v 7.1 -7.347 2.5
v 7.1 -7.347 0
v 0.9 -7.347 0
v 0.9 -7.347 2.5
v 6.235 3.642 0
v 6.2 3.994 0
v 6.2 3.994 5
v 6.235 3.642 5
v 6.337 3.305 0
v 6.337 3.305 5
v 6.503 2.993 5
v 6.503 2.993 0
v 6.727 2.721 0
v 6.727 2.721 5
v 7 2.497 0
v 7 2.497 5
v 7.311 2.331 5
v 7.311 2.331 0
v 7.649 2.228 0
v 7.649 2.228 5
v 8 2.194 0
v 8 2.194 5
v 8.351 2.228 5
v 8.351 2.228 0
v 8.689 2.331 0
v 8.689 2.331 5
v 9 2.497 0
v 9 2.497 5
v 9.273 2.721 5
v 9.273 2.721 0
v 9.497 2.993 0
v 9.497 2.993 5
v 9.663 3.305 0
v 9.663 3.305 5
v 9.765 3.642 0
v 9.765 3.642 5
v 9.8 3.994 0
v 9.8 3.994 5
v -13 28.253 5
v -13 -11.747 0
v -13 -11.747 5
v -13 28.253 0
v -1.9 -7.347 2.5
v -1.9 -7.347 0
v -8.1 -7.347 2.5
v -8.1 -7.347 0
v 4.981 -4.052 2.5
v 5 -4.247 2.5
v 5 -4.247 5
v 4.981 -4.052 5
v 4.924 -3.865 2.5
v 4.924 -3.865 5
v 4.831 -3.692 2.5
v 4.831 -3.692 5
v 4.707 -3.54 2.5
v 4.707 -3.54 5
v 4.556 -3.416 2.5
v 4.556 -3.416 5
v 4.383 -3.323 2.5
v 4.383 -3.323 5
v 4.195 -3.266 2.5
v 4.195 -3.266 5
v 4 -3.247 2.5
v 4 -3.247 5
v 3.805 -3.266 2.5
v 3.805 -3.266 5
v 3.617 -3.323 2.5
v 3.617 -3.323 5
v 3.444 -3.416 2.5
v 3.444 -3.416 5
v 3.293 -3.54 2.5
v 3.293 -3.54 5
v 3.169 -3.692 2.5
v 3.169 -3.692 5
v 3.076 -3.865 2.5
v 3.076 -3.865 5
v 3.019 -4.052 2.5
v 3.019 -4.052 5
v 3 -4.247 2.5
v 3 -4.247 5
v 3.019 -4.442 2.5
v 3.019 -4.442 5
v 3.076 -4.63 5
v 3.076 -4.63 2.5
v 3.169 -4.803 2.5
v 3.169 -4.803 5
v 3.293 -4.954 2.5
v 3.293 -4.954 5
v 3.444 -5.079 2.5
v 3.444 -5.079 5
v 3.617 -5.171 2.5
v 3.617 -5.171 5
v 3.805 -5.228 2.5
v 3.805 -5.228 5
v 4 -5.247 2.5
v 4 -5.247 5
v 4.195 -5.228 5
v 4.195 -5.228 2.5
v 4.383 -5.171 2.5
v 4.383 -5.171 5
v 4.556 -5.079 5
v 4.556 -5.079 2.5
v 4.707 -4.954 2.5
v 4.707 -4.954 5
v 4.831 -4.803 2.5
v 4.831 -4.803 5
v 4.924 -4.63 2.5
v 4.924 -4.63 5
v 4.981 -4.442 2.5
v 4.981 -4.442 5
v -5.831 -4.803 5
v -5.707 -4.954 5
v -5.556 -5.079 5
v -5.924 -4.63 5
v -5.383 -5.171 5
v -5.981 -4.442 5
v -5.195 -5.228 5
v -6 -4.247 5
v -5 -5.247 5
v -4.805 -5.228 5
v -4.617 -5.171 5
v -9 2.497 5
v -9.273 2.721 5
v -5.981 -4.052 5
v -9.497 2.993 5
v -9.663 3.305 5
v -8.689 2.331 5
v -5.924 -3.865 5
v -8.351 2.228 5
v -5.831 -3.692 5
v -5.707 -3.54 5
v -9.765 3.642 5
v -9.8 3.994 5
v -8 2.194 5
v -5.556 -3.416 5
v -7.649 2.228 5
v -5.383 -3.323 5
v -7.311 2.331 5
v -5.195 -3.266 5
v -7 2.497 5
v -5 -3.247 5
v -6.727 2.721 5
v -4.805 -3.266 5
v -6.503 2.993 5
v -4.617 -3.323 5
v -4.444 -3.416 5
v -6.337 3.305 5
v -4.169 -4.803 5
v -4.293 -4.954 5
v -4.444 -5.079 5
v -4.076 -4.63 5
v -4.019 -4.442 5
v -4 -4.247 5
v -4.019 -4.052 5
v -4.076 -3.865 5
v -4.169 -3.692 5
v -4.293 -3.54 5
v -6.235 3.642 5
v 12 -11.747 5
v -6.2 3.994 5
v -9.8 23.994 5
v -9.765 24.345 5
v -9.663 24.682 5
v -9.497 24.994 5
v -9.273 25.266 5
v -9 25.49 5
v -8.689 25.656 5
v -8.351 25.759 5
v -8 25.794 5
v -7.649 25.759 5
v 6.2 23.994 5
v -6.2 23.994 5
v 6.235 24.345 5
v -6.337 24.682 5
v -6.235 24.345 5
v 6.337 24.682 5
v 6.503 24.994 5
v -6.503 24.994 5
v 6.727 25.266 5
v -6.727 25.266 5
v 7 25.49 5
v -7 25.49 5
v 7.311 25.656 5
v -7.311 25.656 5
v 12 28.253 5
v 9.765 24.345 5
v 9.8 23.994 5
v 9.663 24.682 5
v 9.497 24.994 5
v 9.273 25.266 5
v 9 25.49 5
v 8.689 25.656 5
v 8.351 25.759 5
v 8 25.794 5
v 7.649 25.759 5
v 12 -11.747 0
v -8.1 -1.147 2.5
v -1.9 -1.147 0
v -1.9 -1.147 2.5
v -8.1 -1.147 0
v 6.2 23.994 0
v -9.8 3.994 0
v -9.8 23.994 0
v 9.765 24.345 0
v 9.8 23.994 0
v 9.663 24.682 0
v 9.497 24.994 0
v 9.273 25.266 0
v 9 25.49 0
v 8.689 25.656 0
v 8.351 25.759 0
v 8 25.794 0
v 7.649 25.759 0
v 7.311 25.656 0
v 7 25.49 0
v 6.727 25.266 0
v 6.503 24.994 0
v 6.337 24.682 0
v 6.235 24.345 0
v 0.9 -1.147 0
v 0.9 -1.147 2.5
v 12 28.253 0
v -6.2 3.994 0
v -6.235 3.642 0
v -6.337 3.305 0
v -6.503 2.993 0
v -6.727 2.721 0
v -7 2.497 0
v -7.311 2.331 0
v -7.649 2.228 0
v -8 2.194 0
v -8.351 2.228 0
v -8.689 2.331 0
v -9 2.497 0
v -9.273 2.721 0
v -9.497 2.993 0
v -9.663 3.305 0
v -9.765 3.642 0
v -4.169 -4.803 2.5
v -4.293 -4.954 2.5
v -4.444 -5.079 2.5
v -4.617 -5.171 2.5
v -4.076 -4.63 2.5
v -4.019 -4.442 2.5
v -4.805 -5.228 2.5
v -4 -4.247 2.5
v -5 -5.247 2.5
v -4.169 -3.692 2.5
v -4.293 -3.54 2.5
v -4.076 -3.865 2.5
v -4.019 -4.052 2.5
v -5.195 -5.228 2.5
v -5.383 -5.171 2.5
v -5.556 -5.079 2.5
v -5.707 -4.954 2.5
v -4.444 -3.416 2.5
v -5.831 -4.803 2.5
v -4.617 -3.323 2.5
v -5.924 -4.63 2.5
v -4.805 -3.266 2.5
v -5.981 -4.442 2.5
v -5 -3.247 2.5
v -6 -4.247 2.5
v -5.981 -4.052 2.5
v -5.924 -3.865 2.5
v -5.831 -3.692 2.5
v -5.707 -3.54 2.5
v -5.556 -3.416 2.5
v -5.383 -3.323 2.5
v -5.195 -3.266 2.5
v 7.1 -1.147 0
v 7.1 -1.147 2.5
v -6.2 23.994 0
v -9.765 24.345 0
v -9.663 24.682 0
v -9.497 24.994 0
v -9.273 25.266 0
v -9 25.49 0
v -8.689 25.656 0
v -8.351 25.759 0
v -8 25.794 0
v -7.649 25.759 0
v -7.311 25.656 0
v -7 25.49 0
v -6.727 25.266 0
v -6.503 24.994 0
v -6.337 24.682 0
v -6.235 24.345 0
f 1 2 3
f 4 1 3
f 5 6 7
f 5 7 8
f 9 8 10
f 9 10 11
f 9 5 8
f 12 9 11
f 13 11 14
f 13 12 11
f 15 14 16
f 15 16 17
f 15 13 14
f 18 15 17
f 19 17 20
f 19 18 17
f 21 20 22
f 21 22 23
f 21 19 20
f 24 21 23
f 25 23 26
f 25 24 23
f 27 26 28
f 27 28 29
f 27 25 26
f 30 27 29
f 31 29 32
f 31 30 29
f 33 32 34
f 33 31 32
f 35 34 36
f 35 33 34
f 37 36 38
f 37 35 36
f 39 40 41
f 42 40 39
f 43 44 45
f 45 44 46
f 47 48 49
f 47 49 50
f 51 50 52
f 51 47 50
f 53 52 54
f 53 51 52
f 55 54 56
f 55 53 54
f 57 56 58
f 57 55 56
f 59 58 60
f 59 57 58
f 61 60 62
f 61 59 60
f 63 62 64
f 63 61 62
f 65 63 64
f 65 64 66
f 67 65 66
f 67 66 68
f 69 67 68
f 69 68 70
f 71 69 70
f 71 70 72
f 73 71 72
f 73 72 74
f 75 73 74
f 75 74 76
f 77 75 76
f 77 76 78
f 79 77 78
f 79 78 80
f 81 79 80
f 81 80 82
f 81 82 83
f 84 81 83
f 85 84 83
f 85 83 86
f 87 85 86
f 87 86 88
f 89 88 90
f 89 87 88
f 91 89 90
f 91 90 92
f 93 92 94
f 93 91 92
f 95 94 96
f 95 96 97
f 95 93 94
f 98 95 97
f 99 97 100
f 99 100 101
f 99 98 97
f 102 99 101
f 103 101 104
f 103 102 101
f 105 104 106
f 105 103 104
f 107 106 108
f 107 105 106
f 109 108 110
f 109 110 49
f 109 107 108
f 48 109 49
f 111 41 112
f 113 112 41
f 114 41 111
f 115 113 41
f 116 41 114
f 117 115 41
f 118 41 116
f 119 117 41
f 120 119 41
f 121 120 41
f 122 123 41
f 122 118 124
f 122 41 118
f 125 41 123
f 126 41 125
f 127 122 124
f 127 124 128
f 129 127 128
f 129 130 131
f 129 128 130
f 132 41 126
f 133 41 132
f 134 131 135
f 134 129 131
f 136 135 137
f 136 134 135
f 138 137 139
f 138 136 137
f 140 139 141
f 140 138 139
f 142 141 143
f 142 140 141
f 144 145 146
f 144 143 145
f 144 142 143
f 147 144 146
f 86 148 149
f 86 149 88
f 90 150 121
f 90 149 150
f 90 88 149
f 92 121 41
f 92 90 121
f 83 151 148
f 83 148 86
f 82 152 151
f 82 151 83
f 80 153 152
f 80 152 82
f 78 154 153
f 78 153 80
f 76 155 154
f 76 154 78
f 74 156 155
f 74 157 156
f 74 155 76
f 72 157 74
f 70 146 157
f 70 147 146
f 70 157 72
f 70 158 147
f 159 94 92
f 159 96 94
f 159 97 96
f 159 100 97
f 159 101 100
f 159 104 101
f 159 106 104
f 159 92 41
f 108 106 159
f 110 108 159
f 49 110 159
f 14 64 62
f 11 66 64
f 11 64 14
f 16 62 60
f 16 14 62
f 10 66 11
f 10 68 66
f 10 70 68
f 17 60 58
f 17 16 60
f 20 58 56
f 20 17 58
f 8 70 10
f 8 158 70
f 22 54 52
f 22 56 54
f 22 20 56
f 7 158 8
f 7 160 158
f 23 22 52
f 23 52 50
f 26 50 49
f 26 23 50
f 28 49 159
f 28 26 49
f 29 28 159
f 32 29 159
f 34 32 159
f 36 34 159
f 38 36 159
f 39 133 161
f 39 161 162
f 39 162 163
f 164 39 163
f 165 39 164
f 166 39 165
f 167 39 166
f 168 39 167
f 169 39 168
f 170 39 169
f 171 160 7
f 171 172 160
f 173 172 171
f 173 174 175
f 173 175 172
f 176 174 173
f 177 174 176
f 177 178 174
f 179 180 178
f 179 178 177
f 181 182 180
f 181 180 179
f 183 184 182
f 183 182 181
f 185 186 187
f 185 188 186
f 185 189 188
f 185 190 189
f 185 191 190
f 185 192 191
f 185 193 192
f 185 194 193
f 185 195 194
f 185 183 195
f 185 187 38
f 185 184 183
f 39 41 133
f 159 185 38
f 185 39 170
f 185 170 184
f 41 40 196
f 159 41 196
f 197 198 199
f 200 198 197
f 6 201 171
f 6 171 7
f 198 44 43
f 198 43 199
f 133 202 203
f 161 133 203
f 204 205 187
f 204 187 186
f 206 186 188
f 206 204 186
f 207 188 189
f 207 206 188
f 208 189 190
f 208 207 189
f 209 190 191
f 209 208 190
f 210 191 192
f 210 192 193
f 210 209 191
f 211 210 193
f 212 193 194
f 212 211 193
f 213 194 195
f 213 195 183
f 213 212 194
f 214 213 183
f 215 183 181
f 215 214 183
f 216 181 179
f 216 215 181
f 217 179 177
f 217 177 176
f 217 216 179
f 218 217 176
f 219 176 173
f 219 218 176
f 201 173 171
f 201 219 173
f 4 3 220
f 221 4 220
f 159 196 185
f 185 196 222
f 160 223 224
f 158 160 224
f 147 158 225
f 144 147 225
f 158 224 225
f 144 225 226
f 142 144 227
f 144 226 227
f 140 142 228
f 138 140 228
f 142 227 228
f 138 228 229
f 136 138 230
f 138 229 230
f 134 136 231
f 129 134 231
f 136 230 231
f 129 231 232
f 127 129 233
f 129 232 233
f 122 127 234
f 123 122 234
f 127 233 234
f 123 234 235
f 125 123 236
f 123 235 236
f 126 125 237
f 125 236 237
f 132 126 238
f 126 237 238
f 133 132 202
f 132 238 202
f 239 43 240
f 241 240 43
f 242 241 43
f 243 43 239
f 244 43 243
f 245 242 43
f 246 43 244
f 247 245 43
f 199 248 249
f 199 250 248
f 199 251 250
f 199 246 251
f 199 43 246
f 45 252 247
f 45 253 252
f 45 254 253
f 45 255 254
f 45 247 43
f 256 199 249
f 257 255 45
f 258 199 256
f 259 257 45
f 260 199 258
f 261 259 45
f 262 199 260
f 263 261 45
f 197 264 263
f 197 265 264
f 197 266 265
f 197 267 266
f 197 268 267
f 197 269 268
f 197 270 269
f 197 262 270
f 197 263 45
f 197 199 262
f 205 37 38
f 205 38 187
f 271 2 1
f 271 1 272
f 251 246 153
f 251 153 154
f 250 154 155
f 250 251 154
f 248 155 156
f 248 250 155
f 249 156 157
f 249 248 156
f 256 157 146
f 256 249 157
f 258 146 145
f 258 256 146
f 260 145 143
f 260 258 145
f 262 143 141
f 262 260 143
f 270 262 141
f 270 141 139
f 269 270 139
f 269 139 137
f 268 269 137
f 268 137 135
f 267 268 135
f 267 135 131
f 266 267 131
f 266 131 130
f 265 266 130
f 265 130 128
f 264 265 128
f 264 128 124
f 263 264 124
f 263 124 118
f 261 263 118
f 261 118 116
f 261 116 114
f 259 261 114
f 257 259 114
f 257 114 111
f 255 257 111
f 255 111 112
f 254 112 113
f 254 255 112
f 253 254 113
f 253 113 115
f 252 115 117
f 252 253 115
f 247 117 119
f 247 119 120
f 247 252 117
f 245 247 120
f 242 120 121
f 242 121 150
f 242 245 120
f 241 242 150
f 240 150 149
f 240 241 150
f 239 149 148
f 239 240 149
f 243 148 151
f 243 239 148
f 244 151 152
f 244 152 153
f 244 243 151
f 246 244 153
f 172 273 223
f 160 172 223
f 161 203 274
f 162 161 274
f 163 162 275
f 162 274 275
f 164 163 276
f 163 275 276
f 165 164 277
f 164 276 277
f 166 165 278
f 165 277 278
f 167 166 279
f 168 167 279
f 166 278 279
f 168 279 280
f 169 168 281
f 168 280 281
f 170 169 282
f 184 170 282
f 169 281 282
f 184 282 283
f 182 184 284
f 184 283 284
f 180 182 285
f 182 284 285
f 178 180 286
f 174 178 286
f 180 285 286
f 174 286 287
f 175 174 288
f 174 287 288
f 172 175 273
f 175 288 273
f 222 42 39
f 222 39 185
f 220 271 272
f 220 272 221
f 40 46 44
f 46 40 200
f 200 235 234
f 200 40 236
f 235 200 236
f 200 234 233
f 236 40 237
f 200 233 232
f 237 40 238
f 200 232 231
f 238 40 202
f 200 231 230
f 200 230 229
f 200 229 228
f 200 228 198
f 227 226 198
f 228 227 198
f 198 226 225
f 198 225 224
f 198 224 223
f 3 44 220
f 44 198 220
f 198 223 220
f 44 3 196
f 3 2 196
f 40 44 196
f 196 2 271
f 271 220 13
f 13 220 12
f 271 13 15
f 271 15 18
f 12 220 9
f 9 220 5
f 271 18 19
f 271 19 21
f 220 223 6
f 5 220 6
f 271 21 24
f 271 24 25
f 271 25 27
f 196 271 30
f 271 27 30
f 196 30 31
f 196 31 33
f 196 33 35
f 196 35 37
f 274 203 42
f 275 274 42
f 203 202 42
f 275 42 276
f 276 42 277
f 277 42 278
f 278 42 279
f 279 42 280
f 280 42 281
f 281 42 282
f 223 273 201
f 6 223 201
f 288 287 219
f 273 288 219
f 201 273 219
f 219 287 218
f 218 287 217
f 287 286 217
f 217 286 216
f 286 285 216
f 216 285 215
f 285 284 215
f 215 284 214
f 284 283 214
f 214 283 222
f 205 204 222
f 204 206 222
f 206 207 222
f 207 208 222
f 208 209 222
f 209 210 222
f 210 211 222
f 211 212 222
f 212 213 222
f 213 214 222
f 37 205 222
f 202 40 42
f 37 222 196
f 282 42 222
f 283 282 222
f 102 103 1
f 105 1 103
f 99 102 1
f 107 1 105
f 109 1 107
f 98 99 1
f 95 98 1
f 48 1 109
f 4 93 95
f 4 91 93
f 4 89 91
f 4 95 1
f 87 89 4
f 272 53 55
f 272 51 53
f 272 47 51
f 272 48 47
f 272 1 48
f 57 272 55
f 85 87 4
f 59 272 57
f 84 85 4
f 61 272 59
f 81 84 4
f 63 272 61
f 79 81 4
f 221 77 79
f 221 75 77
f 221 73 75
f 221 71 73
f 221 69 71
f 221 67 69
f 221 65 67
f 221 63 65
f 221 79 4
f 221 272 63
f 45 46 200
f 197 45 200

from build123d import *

# Parameters (mm, degrees)
SKETCH1_W           = 25
SKETCH1_H           = 40
SKETCH1_R           = 1
BOSS_EXTRUDE1_DEPTH = 5
SKETCH2_W           = 6.2
SKETCH2_H           = 6.2
CUT_EXTRUDE1_DEPTH  = 2.5


with BuildPart() as part:
    # Sketch1 → Boss-Extrude1 (new body)
    with BuildSketch(Plane.XY):
        with Locations((-0.5, 8.252788104)):
            Rectangle(SKETCH1_W, SKETCH1_H)
        with Locations((-5, -4.247211896)):
            Circle(SKETCH1_R, mode=Mode.SUBTRACT)
        with Locations((4, -4.247211896)):
            Circle(SKETCH1_R, mode=Mode.SUBTRACT)
        with BuildLine():
            Line((-6.2, 23.993504103), (-6.2, 3.993504103))
            ThreePointArc((-6.2, 3.993504103), (-8, 2.193504103), (-9.8, 3.993504103))
            Line((-9.8, 3.993504103), (-9.8, 23.993504103))
            ThreePointArc((-9.8, 23.993504103), (-8, 25.793504103), (-6.2, 23.993504103))
        make_face(mode=Mode.SUBTRACT)
        with BuildLine():
            Line((6.2, 23.993504103), (6.2, 3.993504103))
            ThreePointArc((6.2, 3.993504103), (8, 2.193504103), (9.8, 3.993504103))
            Line((9.8, 3.993504103), (9.8, 23.993504103))
            ThreePointArc((9.8, 23.993504103), (8, 25.793504103), (6.2, 23.993504103))
        make_face(mode=Mode.SUBTRACT)
    extrude(amount=BOSS_EXTRUDE1_DEPTH)

    # Sketch2 → Cut-Extrude1 (cut)
    with BuildSketch(Plane(origin=(0, 0, 0), x_dir=(-1, 0, 0), z_dir=(0, 0, -1))):
        with Locations((-4, -4.247211896)):
            Rectangle(SKETCH2_W, SKETCH2_H)
        with Locations((5, -4.247211896)):
            Rectangle(SKETCH2_W, SKETCH2_H)
    extrude(amount=-CUT_EXTRUDE1_DEPTH, mode=Mode.SUBTRACT)


solid = part.part
